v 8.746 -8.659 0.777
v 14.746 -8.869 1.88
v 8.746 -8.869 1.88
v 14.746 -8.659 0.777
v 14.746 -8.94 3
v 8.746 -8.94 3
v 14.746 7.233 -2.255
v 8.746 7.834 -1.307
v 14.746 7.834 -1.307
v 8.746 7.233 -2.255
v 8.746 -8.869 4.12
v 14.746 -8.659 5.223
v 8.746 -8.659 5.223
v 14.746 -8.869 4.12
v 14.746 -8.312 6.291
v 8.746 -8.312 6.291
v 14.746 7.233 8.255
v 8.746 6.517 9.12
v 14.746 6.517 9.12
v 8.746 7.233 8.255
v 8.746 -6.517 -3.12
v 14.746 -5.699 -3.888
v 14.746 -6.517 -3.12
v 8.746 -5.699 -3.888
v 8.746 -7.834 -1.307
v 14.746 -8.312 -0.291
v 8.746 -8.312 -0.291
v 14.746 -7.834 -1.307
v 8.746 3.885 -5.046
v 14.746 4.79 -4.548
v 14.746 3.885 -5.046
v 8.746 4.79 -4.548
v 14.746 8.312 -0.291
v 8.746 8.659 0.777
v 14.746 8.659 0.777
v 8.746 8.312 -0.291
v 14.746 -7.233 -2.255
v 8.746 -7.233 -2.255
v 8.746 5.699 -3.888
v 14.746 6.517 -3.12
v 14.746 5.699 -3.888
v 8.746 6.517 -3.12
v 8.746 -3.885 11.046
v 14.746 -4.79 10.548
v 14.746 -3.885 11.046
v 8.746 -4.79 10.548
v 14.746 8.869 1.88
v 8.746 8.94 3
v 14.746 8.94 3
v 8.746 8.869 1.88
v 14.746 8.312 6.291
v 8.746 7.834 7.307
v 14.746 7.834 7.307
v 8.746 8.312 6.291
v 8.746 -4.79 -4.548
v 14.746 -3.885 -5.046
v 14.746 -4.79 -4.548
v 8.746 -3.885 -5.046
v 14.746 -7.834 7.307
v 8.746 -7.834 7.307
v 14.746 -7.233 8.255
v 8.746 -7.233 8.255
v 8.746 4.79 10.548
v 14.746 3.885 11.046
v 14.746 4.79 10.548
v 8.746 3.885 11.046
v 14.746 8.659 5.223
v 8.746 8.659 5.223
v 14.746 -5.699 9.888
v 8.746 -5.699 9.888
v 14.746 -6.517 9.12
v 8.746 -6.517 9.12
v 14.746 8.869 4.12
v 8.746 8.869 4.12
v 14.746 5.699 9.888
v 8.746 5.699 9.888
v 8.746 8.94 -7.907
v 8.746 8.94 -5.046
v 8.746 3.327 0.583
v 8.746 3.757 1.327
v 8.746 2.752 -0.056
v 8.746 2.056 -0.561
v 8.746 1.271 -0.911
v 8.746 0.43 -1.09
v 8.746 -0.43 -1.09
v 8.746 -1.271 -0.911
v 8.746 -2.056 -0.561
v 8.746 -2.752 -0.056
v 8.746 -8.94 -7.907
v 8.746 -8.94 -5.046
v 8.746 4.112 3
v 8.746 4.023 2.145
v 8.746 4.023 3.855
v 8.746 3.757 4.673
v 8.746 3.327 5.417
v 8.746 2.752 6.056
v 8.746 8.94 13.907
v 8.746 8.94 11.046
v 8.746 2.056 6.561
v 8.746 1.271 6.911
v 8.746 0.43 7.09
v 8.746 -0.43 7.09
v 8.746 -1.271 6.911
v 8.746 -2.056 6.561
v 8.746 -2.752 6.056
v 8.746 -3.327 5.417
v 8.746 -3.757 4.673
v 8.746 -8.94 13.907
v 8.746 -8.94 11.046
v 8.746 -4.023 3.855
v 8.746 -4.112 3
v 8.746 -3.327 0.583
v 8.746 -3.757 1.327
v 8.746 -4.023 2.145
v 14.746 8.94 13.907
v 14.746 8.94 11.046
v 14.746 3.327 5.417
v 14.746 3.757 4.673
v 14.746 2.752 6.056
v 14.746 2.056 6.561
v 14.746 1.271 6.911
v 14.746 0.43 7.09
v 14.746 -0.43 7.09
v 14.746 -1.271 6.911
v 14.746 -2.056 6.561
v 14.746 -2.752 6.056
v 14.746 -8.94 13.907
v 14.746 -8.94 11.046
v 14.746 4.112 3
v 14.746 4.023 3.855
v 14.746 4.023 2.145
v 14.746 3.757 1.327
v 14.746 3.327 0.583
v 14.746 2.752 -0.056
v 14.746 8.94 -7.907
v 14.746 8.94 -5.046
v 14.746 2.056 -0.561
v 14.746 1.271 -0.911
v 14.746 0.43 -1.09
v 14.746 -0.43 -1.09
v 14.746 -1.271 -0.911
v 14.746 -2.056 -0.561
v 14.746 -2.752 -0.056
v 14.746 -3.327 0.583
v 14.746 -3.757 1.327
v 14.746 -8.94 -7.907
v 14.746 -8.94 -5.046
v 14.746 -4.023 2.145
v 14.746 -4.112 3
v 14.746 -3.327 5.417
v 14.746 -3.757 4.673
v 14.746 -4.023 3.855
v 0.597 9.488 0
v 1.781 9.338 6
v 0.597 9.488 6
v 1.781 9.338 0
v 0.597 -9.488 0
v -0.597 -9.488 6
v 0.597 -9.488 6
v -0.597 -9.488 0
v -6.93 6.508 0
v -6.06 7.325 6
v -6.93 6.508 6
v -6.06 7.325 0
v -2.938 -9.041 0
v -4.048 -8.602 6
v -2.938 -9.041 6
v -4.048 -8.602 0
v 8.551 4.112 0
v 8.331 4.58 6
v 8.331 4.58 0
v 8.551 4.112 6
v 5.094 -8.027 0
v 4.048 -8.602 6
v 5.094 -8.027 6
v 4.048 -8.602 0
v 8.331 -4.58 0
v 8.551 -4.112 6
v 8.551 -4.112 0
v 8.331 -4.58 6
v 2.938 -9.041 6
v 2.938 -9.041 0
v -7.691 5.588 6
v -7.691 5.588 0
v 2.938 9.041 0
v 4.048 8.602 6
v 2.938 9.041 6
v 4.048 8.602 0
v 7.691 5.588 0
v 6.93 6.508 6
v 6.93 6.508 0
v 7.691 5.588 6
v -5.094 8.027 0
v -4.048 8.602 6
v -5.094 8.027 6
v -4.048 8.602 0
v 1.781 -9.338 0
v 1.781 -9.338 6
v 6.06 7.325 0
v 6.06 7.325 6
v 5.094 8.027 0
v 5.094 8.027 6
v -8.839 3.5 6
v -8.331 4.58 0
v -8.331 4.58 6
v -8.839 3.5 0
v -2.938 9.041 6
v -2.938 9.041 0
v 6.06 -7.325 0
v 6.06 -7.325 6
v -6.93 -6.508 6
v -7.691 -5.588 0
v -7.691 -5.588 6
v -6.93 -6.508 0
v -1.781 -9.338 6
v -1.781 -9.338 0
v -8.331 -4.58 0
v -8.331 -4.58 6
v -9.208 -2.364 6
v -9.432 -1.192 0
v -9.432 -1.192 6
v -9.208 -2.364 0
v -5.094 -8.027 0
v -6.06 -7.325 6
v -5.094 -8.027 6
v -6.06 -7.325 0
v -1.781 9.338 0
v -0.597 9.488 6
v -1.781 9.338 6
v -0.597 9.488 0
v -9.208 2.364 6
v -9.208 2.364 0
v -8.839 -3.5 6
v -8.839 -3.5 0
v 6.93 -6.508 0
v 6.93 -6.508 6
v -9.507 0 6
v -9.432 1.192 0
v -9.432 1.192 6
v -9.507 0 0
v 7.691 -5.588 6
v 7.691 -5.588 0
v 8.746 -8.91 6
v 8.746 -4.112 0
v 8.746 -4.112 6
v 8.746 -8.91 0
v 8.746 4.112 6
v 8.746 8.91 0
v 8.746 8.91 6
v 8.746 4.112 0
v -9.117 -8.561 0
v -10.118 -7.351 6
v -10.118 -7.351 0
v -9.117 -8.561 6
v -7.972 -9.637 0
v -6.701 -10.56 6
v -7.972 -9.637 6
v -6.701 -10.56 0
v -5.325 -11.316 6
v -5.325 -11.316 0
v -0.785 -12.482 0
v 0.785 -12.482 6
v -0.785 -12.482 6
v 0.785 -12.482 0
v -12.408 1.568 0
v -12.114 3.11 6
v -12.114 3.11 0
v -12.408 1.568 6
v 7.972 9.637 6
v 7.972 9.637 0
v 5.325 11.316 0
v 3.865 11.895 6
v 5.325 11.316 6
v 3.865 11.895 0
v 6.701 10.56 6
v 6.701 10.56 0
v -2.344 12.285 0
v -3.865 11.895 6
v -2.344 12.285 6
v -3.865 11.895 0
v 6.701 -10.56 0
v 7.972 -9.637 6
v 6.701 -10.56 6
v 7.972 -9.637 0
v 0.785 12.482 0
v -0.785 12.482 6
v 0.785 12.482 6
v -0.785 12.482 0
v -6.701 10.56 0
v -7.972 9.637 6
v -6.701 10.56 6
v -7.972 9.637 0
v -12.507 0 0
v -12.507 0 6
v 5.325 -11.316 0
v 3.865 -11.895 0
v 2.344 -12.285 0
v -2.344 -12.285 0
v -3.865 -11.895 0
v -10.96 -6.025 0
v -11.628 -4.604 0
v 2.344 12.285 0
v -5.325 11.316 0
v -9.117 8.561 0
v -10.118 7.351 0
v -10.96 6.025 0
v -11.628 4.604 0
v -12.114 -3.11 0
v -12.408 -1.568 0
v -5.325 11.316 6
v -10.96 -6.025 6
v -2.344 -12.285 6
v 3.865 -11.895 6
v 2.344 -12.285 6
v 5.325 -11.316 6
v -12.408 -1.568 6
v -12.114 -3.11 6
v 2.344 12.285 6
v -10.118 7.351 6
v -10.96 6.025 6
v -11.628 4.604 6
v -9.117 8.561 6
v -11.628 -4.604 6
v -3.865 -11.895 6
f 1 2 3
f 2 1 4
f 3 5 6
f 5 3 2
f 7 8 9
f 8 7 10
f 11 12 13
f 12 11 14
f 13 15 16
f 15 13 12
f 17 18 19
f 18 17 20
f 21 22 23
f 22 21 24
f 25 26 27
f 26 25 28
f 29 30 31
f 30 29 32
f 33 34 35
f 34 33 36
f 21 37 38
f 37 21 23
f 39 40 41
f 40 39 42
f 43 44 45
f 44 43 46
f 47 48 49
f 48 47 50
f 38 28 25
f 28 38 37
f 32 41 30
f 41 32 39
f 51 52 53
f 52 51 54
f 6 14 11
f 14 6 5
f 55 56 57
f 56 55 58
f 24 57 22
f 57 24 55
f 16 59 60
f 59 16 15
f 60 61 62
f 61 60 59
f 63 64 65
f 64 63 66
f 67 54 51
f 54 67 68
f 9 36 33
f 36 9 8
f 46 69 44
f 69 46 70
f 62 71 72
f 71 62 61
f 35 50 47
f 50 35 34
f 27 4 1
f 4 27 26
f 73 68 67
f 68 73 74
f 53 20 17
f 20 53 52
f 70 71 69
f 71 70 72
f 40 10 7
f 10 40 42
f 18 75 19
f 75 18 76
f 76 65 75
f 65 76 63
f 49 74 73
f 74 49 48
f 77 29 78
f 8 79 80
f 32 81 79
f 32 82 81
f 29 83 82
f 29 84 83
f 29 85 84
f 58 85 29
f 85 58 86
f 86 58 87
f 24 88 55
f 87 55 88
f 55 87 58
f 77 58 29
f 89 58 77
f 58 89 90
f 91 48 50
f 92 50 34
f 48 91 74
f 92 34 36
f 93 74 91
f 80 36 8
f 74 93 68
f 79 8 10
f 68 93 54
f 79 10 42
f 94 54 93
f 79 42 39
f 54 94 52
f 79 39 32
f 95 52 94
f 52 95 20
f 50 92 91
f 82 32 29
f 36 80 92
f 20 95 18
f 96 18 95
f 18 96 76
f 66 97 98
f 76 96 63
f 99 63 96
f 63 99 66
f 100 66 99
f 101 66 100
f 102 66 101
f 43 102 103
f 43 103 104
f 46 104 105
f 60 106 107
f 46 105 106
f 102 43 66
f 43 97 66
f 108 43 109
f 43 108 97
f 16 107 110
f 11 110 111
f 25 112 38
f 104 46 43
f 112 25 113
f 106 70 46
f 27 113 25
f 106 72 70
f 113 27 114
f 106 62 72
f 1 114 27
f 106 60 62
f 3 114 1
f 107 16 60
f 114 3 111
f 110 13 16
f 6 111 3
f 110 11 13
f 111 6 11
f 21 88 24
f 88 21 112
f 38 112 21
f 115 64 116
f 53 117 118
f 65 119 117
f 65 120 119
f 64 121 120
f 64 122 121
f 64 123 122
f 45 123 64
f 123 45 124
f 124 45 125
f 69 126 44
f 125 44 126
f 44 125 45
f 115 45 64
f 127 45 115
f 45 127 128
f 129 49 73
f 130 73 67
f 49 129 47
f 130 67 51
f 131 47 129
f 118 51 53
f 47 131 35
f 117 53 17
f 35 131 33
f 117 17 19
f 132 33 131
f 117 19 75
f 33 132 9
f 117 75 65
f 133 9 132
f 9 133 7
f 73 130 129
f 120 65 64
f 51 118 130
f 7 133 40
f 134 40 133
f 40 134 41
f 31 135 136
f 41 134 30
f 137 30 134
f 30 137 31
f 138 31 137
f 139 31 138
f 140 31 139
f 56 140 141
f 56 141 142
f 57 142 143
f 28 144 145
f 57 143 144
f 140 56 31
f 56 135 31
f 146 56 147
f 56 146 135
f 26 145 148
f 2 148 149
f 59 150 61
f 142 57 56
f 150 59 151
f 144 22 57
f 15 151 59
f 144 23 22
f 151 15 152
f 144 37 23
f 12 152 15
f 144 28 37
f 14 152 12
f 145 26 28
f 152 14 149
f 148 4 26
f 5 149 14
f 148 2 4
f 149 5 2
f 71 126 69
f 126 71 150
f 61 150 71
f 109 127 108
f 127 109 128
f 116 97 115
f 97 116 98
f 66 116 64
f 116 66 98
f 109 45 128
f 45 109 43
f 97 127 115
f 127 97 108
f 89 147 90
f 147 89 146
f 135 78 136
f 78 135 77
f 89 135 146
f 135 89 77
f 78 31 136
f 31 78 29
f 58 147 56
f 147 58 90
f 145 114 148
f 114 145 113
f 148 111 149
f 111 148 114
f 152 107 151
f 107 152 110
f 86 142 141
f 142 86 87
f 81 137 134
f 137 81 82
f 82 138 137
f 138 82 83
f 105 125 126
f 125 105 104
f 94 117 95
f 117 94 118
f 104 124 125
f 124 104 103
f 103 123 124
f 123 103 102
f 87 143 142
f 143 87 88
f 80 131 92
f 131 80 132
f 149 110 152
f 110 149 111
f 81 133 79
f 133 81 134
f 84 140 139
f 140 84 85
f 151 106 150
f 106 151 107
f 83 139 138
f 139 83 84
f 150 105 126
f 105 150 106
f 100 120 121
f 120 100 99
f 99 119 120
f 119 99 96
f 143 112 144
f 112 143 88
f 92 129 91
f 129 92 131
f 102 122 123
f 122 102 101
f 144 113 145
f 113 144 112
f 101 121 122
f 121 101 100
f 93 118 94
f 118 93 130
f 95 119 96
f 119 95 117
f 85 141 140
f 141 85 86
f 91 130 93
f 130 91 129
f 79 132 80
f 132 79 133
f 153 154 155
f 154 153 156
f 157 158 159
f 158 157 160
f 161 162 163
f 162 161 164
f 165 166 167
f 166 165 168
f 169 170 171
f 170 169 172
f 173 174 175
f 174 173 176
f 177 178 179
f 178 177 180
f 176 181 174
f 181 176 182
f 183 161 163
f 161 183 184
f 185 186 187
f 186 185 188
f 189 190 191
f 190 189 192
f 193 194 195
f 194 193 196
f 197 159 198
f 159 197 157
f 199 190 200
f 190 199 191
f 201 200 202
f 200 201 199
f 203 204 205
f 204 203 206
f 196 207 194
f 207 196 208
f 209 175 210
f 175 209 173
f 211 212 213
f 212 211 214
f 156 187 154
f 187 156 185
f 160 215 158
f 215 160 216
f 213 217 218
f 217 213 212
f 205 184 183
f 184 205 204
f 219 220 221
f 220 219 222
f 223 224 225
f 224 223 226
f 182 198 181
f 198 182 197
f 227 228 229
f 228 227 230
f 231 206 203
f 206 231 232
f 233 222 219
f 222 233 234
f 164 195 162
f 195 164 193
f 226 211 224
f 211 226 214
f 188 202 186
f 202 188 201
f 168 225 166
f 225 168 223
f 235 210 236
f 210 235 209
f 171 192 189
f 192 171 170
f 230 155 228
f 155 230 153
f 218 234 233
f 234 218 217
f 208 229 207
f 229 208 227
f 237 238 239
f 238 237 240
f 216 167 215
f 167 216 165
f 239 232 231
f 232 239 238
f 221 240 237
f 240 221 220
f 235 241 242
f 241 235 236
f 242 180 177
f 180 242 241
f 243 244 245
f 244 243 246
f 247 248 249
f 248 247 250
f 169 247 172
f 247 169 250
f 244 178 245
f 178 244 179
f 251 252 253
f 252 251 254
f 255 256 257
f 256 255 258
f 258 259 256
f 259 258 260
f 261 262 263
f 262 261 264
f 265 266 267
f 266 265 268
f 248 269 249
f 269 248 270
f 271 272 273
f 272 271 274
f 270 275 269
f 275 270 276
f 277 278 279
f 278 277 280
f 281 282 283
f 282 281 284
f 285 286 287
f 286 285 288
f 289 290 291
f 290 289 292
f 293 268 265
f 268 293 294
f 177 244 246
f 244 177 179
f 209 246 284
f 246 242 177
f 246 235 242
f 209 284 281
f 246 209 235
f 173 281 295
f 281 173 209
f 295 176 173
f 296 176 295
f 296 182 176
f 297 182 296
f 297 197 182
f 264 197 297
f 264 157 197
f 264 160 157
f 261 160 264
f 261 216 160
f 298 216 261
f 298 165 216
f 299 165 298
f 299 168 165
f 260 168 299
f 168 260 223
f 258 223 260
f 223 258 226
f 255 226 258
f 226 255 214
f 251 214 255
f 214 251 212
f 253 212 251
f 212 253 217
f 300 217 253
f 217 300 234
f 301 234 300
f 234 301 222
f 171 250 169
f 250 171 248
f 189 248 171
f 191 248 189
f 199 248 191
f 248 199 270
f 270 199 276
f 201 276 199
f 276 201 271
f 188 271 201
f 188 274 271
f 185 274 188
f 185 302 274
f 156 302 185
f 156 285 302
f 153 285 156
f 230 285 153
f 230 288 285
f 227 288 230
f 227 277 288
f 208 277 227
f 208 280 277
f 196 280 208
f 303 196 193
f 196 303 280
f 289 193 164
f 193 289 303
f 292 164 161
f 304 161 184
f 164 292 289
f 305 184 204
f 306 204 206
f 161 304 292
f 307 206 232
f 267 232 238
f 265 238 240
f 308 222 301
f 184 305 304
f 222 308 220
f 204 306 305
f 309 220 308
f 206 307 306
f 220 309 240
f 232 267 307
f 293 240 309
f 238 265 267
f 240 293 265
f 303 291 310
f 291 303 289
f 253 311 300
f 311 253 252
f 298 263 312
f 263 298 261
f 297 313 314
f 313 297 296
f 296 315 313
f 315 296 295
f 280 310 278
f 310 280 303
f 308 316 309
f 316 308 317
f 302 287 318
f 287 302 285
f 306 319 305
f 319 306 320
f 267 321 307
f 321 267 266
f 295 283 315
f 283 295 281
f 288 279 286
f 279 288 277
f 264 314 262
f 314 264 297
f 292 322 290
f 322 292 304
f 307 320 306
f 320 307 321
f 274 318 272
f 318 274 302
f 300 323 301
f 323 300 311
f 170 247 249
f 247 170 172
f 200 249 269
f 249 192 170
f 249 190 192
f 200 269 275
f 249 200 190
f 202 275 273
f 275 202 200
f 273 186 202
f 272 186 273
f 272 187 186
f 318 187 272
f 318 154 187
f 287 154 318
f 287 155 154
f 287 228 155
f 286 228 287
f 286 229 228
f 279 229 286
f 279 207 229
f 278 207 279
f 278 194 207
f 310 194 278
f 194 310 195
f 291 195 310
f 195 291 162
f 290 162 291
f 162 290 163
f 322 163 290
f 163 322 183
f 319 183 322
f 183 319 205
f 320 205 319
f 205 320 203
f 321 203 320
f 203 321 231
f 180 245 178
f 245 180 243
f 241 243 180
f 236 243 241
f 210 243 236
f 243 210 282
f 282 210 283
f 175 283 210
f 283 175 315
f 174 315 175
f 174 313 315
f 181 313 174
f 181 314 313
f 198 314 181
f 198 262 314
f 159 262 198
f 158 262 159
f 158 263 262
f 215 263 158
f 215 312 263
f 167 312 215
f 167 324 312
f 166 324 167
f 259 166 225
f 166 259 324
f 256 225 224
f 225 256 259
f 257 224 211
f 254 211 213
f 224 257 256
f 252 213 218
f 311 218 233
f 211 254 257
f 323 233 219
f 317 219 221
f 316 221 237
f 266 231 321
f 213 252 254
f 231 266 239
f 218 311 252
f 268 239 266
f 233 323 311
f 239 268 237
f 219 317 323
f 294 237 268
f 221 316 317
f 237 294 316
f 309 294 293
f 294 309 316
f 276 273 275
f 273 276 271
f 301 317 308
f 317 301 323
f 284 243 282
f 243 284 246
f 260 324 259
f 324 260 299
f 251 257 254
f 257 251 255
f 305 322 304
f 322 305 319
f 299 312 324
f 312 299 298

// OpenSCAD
// preview[view:north east, tilt:top diagonal]

//ring size on US scale
size = 9; //[1:.5:20]

//thickness of the ring (mm from inner to outer diameter)
thickness = 3; //[1:.5:5]

//depth of the ring (mm)
ring_depth = 6; //[3:.5:20]

//depth of the symbol (mm)
symbol_depth = 6; //[3:.5:20]

// Which part would you like to see?
part = "both"; // [both:Both,ring:Ring Only,logo:Symbol Only]

rs = size*0.82938 + 11.549;
glod = 2*sqrt(pow((rs+2*thickness)/2,2)-pow(.46*rs,2));

print_part();

module print_part() {
	if (part == "both") {
		both();
	} else if (part == "ring") {
		ring();
	} else if (part == "logo") {
		logo();
	} else {
		both();
	}
}

module ring(){
	difference(){
		cylinder(r = rs/2+thickness, h = ring_depth, $fn=50);
		union(){
			translate([0,0,-.1])cylinder(r = rs/2, h = ring_depth+.2, $fn=50);
			translate([rs*.46,-25,-.1]) cube([50,50,ring_depth+.2]);
			translate([25,0,thickness]) cube([50,.46*glod,ring_depth+.2],center=true);
		}
	}
}

module logo(){
	difference(){
		union(){
			cylinder(r=glod/2,h=symbol_depth, $fn=50);
			translate([-glod/2,-.45*glod-.16*glod,0]){
				cube([glod,.16*glod,symbol_depth]);
			}
			translate([-glod/2,.45*glod,0]){
				cube([glod,.16*glod,symbol_depth]);
			}
		}
		union(){
			translate([0,0,-.1]) cylinder(r=.46*glod/2,h=symbol_depth+.2, $fn=30);
		}
	}
}

module both(){
	translate([rs*.46,0,ring_depth/2]) rotate(a=90,v=[0,1,0]) rotate(a=-90,v=[0,0,1]) logo();
	ring();
}
